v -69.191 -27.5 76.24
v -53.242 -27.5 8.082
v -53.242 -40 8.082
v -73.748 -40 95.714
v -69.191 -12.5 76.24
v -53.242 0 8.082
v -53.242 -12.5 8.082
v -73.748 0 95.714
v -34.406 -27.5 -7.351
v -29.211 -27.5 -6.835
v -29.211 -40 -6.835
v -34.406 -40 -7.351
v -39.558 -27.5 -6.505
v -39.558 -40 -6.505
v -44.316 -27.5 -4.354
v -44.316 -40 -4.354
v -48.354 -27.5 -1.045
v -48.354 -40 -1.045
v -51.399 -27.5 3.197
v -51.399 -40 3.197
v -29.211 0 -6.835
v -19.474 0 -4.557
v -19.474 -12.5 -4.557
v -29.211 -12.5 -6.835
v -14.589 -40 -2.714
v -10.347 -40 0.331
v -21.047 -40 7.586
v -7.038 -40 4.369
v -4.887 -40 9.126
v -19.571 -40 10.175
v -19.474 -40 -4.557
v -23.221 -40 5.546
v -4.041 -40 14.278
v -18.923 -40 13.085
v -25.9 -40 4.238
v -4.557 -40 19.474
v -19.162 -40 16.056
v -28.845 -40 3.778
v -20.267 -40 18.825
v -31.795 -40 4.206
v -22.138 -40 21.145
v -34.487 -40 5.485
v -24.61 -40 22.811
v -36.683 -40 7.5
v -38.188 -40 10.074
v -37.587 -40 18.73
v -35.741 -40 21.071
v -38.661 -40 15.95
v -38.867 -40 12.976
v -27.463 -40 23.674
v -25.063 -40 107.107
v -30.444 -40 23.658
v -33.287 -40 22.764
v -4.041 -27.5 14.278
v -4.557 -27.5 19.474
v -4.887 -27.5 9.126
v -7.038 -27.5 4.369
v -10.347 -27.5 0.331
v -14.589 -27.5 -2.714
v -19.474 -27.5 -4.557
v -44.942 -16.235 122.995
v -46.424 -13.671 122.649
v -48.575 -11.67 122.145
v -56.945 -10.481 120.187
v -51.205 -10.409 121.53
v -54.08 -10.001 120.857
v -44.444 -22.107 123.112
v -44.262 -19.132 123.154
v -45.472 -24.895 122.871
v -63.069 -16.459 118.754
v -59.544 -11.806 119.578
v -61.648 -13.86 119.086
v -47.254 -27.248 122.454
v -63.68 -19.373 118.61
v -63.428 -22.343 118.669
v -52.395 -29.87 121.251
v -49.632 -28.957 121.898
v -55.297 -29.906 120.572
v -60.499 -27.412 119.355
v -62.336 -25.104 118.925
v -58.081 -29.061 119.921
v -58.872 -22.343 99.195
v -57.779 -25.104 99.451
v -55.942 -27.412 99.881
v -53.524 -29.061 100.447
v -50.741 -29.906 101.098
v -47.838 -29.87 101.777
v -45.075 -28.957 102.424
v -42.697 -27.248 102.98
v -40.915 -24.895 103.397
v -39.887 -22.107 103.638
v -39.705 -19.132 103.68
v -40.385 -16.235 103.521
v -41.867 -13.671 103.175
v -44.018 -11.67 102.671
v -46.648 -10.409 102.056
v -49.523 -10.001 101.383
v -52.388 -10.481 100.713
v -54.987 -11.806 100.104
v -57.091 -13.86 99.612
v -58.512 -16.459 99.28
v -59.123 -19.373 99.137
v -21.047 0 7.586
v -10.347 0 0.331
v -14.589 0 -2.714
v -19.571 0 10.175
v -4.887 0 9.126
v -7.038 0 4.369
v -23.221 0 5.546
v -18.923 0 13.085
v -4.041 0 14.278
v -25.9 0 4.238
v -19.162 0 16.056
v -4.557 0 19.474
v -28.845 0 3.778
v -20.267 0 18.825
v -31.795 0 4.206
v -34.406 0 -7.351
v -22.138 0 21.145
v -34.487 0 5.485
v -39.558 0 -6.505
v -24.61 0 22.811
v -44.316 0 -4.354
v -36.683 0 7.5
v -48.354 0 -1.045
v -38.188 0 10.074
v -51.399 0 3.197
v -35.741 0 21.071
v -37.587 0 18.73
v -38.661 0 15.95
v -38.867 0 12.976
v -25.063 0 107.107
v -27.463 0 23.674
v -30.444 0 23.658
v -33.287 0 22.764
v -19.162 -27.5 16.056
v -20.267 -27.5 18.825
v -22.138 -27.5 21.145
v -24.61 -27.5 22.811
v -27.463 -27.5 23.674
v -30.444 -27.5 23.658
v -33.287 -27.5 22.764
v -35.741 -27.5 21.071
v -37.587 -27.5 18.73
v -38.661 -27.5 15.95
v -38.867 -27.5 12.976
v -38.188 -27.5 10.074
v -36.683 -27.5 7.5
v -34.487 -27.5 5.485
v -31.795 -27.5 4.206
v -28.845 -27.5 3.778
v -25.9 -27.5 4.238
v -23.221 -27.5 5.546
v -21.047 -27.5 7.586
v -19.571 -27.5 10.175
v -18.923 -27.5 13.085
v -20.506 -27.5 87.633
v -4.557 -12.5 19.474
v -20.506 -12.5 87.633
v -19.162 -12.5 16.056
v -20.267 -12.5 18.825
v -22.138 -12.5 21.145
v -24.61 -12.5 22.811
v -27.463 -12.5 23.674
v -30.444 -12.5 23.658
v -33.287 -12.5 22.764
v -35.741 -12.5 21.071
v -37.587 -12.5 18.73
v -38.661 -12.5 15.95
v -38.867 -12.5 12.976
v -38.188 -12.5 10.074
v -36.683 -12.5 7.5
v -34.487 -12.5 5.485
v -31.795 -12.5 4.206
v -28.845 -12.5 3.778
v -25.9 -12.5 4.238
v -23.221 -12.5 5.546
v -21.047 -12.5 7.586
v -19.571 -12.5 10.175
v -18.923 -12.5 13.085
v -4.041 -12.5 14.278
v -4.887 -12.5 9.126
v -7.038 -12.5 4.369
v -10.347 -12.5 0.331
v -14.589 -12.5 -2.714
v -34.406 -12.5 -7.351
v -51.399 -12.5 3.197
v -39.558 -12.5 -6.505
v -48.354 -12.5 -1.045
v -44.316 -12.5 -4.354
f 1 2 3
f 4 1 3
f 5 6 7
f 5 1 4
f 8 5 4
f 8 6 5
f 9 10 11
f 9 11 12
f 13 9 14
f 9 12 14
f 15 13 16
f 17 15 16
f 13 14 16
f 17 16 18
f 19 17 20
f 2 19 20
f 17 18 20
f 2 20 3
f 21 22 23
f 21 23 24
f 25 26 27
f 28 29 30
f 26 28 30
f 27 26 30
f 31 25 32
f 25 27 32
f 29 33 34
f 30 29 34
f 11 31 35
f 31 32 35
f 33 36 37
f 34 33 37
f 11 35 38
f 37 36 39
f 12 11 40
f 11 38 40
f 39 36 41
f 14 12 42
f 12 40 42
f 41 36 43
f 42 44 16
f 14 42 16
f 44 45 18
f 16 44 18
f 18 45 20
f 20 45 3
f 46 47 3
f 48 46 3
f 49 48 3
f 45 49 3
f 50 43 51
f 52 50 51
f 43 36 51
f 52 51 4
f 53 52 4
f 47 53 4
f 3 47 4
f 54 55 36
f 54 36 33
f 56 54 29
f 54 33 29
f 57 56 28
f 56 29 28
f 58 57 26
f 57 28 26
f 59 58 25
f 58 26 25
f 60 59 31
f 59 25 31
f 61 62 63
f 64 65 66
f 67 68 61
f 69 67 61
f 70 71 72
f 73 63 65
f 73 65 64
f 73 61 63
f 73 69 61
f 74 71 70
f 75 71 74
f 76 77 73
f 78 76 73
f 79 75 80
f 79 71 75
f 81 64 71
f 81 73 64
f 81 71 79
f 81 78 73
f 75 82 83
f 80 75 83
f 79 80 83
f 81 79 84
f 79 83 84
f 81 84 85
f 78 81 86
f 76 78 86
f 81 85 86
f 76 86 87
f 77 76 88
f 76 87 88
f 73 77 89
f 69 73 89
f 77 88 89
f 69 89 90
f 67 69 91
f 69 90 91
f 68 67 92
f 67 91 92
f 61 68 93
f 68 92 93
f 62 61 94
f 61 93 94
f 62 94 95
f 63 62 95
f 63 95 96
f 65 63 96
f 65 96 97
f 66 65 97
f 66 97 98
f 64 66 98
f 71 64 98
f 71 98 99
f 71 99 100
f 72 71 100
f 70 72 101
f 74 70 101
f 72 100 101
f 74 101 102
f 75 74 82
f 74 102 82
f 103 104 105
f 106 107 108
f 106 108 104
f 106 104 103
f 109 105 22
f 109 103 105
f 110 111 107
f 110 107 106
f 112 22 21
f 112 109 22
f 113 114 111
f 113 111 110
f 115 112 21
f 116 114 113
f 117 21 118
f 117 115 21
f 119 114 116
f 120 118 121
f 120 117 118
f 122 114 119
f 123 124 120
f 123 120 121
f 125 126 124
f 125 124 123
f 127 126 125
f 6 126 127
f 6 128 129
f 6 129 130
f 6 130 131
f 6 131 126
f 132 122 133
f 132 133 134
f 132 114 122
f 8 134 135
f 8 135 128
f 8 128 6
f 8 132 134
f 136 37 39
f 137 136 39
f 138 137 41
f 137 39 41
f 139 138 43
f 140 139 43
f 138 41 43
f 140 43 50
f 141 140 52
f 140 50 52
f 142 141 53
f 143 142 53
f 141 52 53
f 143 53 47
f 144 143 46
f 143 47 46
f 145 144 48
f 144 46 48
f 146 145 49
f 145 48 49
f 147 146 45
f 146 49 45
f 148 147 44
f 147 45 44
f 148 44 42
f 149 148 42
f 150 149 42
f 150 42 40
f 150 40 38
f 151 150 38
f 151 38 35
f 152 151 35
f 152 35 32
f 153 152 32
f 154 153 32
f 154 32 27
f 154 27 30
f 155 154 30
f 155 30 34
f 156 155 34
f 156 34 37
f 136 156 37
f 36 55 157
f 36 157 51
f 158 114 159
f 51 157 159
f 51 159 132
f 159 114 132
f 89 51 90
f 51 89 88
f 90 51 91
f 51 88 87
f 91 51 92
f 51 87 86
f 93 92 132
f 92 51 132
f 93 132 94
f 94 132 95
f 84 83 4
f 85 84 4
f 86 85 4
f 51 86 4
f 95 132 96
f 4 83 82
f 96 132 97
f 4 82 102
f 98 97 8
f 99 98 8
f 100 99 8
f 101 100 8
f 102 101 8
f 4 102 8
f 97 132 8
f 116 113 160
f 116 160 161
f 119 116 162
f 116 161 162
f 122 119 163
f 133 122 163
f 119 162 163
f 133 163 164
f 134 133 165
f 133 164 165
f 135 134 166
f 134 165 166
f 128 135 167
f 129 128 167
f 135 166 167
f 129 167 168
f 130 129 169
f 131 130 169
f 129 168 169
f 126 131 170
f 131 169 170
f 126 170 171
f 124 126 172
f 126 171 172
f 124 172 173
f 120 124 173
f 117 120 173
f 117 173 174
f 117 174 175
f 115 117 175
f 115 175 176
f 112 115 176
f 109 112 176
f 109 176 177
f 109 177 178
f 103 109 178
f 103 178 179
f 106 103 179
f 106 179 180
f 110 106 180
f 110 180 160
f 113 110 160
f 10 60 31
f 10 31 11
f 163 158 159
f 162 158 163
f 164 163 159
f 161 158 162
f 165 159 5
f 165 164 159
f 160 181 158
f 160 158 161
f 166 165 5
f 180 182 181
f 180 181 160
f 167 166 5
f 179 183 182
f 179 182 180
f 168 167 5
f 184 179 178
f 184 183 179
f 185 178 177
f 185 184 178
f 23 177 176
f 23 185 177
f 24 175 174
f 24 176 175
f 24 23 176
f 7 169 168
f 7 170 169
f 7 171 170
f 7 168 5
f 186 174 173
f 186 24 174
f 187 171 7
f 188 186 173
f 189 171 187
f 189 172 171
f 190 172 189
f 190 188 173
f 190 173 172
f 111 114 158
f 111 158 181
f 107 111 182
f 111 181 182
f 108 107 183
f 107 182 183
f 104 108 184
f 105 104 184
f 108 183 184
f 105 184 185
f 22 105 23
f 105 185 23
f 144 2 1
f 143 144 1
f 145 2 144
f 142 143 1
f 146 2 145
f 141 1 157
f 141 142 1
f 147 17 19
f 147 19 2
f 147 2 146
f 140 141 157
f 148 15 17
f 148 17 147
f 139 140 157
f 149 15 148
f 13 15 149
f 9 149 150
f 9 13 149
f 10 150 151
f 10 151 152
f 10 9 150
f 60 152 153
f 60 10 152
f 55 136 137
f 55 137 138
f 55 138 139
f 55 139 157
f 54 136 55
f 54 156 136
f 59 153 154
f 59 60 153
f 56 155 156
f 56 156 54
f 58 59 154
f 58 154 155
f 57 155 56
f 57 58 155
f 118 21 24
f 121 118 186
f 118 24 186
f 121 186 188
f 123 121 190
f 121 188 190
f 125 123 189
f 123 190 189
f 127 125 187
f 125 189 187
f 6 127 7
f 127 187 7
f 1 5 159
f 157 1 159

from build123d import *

# Parameters (mm, degrees)
SKETCH9_W           = 50
SKETCH9_H           = 110
BOSS_EXTRUDE3_DEPTH = 40
CUT_EXTRUDE4_DEPTH  = 90
FILLET2_R           = 20
SKETCH15_R          = 10
CUT_EXTRUDE5_DEPTH  = 41
SKETCH22_R          = 10
BOSS_EXTRUDE4_DEPTH = 20


with BuildPart() as part:
    # Sketch9 → Boss-Extrude3 (new body)
    with BuildSketch(Plane(origin=(-33.280188112, 0, 144.42881153), x_dir=(-0.973697035, 0, -0.227846622), z_dir=(0, 1, 0))):
        with Locations((25.502796398, -93.212684061)):
            Rectangle(SKETCH9_W, SKETCH9_H)
    extrude(amount=-BOSS_EXTRUDE3_DEPTH)

    # Sketch14 → Cut-Extrude4 (cut)
    with BuildSketch(Plane(origin=(1.578968454, -248.415731332, 0.369481077), x_dir=(0.949498442, -0.221555699, 0.222184114), z_dir=(-0.227846622, 0, 0.973697035))):
        Polygon((-102.607181661, 218.615622522), (-99.28384617, 203.988406751), (-50.526460266, 215.066191719), (-53.849795757, 229.69340749), align=None)
    extrude(amount=CUT_EXTRUDE4_DEPTH, mode=Mode.SUBTRACT)

    # Fillet2
    fillet2_edges = [part.edges().sort_by_distance(p)[0] for p in [
        (0, -6.25, 0),
        (-48.684851767, -6.25, -11.392331125),
        (-48.684851767, -33.75, -11.392331125),
        (0, -33.75, 0),
    ]]
    fillet(fillet2_edges, radius=FILLET2_R)

    # Sketch15 → Cut-Extrude5 (cut, through all)
    with BuildSketch(Plane(origin=(0, -40, 0), x_dir=(0.973697035, 0, 0.227846622), z_dir=(0, -1, 0))):
        with Locations((-25, 20)):
            Circle(SKETCH15_R)
    extrude(amount=-CUT_EXTRUDE5_DEPTH, mode=Mode.SUBTRACT)

    # Sketch22 → Boss-Extrude4 (add)
    with BuildSketch(Plane(origin=(-24.856078548, -32.574722266, 107.155123892), x_dir=(-0.94660116, -0.234267522, -0.221506145), z_dir=(-0.227846622, 0, 0.973697035))):
        with Locations((21.565180907, -18.131298438)):
            Circle(SKETCH22_R)
    extrude(amount=BOSS_EXTRUDE4_DEPTH)


solid = part.part
